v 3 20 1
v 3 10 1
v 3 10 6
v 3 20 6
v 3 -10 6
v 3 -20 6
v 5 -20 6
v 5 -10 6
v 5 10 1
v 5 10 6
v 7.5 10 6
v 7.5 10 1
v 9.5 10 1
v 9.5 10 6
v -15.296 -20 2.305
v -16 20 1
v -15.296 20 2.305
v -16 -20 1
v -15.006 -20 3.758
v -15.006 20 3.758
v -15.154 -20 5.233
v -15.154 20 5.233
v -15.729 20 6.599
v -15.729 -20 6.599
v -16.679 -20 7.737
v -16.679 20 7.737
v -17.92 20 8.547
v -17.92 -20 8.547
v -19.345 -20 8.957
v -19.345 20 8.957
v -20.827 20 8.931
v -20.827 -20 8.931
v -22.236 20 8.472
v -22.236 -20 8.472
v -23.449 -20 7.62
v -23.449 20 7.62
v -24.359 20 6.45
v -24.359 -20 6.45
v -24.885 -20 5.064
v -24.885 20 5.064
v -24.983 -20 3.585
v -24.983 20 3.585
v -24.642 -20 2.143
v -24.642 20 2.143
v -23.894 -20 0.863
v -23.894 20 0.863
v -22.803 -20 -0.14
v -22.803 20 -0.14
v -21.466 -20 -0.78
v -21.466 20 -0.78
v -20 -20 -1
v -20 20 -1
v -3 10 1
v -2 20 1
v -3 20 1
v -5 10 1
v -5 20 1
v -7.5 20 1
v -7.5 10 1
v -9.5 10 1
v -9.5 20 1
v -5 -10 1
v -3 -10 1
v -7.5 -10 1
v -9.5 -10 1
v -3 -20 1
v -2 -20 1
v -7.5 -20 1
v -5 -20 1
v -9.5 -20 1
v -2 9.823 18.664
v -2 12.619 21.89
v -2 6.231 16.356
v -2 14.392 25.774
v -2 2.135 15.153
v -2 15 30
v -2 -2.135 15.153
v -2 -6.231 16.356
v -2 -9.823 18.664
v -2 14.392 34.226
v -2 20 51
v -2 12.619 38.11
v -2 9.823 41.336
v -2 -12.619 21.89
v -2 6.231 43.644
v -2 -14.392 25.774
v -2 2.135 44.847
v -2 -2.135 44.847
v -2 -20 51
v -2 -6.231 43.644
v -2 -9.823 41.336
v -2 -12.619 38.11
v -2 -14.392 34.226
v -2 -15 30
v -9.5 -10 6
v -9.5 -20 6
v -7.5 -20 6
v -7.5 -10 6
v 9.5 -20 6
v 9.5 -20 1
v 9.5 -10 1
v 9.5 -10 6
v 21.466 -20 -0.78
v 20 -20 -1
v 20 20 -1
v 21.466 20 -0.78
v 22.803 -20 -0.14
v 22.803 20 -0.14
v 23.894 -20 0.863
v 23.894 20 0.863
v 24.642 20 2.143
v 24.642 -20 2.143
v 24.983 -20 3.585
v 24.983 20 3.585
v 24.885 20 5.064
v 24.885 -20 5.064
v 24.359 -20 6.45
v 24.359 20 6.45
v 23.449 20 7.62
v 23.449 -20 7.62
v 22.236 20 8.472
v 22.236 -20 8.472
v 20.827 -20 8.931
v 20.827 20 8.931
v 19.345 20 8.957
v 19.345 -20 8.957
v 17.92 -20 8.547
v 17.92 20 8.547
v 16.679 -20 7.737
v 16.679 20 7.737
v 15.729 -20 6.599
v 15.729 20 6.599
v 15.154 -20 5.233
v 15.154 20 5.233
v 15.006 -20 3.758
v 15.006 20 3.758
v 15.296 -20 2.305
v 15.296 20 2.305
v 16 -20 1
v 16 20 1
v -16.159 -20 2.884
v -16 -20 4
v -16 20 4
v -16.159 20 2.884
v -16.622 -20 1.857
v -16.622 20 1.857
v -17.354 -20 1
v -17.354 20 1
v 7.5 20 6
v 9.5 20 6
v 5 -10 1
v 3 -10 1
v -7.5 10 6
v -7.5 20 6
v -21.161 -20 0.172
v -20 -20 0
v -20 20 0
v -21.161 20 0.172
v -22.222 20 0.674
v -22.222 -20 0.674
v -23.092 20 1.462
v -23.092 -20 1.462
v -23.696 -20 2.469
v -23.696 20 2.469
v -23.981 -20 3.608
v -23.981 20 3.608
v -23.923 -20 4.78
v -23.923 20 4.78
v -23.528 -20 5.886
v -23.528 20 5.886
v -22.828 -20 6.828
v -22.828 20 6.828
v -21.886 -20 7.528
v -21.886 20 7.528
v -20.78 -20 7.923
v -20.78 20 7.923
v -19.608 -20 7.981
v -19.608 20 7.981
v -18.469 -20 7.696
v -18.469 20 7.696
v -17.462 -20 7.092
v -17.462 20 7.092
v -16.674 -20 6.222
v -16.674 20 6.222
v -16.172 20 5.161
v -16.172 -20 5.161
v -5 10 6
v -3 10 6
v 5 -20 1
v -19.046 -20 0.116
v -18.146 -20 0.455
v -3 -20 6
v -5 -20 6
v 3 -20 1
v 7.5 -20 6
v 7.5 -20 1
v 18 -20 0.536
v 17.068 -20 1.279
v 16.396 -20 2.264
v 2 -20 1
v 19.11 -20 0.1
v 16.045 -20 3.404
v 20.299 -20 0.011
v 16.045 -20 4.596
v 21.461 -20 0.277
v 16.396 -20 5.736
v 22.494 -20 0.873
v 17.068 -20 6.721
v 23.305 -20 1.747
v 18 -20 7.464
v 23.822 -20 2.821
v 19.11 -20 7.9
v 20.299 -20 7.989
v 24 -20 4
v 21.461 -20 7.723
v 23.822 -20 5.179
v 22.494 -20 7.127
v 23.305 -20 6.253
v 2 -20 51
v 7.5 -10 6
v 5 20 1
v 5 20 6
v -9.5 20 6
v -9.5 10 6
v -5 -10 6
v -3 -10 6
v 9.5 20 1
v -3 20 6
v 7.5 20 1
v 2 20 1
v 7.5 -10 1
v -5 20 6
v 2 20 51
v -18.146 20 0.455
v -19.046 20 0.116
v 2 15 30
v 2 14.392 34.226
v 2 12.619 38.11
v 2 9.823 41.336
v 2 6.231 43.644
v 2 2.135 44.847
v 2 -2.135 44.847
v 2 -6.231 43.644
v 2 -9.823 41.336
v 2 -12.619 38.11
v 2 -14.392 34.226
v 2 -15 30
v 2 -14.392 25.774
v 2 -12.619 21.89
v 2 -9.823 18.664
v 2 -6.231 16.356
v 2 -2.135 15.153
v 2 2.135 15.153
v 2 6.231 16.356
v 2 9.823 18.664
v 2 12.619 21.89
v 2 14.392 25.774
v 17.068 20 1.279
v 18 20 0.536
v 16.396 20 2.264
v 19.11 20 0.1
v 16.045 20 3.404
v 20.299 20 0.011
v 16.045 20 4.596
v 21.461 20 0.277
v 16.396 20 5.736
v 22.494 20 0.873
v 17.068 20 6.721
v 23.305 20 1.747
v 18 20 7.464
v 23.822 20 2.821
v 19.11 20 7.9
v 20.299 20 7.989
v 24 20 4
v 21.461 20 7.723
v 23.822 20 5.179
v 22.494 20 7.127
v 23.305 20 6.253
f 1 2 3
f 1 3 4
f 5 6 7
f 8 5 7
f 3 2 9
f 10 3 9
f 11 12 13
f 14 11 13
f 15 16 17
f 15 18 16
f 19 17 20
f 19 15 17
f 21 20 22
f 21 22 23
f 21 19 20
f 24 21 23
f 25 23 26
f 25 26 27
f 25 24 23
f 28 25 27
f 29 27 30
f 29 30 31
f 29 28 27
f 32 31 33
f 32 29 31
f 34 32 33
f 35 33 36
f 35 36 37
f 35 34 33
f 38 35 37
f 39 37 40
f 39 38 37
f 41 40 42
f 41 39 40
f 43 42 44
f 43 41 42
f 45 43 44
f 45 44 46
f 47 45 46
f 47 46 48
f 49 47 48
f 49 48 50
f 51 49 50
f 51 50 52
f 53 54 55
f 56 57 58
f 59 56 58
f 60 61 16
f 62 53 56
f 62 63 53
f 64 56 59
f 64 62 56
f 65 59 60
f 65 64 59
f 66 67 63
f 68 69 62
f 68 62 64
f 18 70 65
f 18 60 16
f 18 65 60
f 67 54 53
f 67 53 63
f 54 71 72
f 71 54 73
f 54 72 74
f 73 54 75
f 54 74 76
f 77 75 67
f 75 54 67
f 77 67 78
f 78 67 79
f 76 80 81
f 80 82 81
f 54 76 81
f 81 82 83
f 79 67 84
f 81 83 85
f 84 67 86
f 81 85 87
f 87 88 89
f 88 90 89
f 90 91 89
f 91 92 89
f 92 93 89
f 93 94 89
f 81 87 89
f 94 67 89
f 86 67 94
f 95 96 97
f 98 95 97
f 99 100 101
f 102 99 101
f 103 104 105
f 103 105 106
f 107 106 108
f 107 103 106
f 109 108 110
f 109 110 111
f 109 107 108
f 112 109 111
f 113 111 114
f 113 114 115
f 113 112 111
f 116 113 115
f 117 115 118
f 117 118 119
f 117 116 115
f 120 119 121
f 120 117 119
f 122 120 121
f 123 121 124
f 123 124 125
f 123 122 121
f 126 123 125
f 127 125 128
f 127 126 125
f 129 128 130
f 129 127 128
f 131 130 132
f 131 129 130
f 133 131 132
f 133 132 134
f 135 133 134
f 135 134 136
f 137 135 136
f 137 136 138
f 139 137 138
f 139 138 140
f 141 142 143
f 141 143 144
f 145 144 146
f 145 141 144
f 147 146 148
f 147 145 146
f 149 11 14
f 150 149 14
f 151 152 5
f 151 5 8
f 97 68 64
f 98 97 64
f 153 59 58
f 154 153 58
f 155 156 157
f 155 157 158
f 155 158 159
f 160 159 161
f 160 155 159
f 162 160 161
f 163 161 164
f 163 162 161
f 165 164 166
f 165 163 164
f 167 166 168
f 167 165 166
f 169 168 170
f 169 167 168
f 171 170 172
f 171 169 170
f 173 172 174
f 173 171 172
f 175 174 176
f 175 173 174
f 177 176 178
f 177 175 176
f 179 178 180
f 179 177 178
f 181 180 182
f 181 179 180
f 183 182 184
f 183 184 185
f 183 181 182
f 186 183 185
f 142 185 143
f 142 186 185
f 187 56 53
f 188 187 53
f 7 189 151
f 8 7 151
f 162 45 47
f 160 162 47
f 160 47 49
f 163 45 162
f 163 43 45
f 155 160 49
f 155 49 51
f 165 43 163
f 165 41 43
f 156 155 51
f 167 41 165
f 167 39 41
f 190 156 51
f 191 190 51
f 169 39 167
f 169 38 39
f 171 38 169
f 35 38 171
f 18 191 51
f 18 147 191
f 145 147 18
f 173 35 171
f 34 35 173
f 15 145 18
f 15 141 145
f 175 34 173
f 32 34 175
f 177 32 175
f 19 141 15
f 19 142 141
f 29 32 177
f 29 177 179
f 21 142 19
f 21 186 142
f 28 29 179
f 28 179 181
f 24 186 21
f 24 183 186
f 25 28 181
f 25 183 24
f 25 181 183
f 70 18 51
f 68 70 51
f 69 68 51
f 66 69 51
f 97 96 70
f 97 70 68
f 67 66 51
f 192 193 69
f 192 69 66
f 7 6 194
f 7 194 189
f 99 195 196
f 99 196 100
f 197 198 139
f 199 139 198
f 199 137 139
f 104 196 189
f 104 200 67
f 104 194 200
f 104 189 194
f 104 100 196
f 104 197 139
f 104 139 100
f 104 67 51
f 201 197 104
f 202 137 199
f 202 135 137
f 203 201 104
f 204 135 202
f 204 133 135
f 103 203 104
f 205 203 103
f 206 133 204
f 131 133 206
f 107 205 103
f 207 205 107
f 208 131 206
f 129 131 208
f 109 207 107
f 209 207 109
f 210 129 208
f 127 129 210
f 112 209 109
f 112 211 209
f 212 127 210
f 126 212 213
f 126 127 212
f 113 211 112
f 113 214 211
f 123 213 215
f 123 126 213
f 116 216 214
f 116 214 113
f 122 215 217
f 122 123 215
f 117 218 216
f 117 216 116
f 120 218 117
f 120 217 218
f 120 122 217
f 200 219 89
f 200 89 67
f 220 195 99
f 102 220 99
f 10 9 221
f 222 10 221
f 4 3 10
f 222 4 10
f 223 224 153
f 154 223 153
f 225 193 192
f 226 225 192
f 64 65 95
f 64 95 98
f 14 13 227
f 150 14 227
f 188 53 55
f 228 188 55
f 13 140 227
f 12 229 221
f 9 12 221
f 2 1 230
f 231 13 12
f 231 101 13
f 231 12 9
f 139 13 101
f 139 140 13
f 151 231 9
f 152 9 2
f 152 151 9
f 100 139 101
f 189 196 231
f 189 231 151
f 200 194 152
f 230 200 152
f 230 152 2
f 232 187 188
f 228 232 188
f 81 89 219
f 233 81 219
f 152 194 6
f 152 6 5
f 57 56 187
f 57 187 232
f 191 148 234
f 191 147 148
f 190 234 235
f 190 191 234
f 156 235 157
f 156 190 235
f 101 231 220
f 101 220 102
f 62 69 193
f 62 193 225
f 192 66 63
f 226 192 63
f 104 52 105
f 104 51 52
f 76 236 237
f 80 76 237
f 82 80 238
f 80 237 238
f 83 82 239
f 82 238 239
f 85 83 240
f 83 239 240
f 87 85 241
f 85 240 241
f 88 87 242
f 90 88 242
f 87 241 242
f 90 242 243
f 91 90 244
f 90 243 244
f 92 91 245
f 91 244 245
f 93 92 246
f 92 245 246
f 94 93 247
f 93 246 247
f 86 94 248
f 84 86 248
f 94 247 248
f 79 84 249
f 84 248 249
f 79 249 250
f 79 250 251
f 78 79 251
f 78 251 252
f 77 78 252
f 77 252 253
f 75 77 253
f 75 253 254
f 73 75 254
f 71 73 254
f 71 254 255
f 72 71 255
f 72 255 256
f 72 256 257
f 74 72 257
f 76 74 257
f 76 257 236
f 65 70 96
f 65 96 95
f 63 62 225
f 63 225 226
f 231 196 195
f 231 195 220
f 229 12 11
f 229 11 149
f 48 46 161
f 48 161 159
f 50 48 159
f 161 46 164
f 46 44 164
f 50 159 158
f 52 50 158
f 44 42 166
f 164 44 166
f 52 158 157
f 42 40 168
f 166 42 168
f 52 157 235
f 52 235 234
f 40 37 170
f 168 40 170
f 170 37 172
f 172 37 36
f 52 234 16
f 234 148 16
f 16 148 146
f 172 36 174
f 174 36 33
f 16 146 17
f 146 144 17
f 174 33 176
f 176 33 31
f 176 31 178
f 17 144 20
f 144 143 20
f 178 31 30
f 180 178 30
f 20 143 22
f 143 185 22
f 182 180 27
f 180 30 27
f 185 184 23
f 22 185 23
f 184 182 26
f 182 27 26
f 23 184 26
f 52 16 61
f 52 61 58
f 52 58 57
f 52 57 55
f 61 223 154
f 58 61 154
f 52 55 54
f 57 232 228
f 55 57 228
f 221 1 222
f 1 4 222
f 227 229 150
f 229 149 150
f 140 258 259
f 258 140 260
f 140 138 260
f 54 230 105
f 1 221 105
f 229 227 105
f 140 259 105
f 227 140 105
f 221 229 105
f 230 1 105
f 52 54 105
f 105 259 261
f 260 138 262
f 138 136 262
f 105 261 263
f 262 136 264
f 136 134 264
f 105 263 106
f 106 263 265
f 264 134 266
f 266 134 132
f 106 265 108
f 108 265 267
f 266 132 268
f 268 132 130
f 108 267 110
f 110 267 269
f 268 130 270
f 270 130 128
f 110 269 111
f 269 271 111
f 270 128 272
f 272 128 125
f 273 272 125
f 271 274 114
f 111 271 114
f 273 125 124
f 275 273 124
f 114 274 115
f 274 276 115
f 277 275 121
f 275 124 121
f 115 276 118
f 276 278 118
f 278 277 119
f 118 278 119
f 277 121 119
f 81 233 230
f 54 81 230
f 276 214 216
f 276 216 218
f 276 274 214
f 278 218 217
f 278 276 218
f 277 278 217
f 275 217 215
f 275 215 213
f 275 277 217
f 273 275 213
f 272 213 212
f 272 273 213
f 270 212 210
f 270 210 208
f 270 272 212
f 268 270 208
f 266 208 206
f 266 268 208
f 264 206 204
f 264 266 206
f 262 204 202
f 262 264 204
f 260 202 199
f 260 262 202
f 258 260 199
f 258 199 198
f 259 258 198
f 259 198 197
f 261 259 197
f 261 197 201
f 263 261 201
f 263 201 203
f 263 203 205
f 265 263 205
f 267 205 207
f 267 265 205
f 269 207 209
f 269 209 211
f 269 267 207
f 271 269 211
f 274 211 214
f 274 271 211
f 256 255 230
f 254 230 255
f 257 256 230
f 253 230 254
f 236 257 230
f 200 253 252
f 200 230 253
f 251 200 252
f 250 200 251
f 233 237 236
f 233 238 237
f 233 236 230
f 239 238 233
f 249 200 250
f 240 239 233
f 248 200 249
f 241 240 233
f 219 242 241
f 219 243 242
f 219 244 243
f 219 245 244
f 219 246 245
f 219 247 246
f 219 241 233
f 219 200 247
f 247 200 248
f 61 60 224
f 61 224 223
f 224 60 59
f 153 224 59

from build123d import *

# Parameters (mm, degrees)
F0_R     = 4
F0_W     = 4
F0_H     = 50
F1_DEPTH = 20
F2_W     = 2
F2_H     = 10
F3_DEPTH = 5
F4_R     = 15
F5_DEPTH = 25
F6_DEPTH = 5


with BuildPart() as f1:
    # F0 (on Front) → F1 (new body, symmetric)
    with BuildSketch(Plane.XZ):
        with BuildLine():
            Line((-20, -1), (20, -1))
            ThreePointArc((20, -1), (22.236068, 8.472136), (16, 1))
            Line((16, 1), (2, 1))
            Line((2, 1), (-2, 1))
            Line((-2, 1), (-16, 1))
            Line((-16, 1), (-17.354249, 1))
            ThreePointArc((-17.354249, 1), (-18.585786, 0.258343), (-20, 0))
            Line((-20, 0), (-20, -1))
        make_face()
        with Locations((20, 4)):
            Circle(F0_R, mode=Mode.SUBTRACT)
        with BuildLine():
            ThreePointArc((-16, 1), (-22.236068, 8.472136), (-20, -1))
            Line((-20, -1), (-20, 0))
            ThreePointArc((-20, 0), (-22.828427, 6.828427), (-16, 4))
            ThreePointArc((-16, 4), (-16.354249, 2.354249), (-17.354249, 1))
            Line((-17.354249, 1), (-16, 1))
        make_face()
        with Locations((0, 26)):
            Rectangle(F0_W, F0_H)
    extrude(amount=F1_DEPTH, both=True)

    # F2 (on face) → F3 (join)
    with BuildSketch(Plane.XY.offset(1)):
        with Locations((8.5, -15)):
            Rectangle(F2_W, F2_H)
        with Locations((4, -15)):
            Rectangle(F2_W, F2_H)
        with Locations((-8.5, -15)):
            Rectangle(F2_W, F2_H)
        with Locations((-4, -15)):
            Rectangle(F2_W, F2_H)
        with Locations((8.5, 15)):
            Rectangle(F2_W, F2_H)
        with Locations((-8.5, 15)):
            Rectangle(F2_W, F2_H)
        with Locations((-4, 15)):
            Rectangle(F2_W, F2_H)
        with Locations((4, 15)):
            Rectangle(F2_W, F2_H)
    extrude(amount=F3_DEPTH)

    # F4 (on face) → F5 (cut)
    with BuildSketch(Plane.YZ.offset(2)):
        with Locations((0, 30)):
            Circle(F4_R)
    extrude(amount=-F5_DEPTH, mode=Mode.SUBTRACT)

    # F2 (on face) → F6 (join)
    with BuildSketch(Plane.XY.offset(1)):
        with Locations((8.5, -15)):
            Rectangle(F2_W, F2_H)
        with Locations((4, -15)):
            Rectangle(F2_W, F2_H)
        with Locations((-8.5, -15)):
            Rectangle(F2_W, F2_H)
        with Locations((-4, -15)):
            Rectangle(F2_W, F2_H)
        with Locations((8.5, 15)):
            Rectangle(F2_W, F2_H)
        with Locations((-8.5, 15)):
            Rectangle(F2_W, F2_H)
        with Locations((-4, 15)):
            Rectangle(F2_W, F2_H)
        with Locations((4, 15)):
            Rectangle(F2_W, F2_H)
    extrude(amount=F6_DEPTH)


solid = f1.part
